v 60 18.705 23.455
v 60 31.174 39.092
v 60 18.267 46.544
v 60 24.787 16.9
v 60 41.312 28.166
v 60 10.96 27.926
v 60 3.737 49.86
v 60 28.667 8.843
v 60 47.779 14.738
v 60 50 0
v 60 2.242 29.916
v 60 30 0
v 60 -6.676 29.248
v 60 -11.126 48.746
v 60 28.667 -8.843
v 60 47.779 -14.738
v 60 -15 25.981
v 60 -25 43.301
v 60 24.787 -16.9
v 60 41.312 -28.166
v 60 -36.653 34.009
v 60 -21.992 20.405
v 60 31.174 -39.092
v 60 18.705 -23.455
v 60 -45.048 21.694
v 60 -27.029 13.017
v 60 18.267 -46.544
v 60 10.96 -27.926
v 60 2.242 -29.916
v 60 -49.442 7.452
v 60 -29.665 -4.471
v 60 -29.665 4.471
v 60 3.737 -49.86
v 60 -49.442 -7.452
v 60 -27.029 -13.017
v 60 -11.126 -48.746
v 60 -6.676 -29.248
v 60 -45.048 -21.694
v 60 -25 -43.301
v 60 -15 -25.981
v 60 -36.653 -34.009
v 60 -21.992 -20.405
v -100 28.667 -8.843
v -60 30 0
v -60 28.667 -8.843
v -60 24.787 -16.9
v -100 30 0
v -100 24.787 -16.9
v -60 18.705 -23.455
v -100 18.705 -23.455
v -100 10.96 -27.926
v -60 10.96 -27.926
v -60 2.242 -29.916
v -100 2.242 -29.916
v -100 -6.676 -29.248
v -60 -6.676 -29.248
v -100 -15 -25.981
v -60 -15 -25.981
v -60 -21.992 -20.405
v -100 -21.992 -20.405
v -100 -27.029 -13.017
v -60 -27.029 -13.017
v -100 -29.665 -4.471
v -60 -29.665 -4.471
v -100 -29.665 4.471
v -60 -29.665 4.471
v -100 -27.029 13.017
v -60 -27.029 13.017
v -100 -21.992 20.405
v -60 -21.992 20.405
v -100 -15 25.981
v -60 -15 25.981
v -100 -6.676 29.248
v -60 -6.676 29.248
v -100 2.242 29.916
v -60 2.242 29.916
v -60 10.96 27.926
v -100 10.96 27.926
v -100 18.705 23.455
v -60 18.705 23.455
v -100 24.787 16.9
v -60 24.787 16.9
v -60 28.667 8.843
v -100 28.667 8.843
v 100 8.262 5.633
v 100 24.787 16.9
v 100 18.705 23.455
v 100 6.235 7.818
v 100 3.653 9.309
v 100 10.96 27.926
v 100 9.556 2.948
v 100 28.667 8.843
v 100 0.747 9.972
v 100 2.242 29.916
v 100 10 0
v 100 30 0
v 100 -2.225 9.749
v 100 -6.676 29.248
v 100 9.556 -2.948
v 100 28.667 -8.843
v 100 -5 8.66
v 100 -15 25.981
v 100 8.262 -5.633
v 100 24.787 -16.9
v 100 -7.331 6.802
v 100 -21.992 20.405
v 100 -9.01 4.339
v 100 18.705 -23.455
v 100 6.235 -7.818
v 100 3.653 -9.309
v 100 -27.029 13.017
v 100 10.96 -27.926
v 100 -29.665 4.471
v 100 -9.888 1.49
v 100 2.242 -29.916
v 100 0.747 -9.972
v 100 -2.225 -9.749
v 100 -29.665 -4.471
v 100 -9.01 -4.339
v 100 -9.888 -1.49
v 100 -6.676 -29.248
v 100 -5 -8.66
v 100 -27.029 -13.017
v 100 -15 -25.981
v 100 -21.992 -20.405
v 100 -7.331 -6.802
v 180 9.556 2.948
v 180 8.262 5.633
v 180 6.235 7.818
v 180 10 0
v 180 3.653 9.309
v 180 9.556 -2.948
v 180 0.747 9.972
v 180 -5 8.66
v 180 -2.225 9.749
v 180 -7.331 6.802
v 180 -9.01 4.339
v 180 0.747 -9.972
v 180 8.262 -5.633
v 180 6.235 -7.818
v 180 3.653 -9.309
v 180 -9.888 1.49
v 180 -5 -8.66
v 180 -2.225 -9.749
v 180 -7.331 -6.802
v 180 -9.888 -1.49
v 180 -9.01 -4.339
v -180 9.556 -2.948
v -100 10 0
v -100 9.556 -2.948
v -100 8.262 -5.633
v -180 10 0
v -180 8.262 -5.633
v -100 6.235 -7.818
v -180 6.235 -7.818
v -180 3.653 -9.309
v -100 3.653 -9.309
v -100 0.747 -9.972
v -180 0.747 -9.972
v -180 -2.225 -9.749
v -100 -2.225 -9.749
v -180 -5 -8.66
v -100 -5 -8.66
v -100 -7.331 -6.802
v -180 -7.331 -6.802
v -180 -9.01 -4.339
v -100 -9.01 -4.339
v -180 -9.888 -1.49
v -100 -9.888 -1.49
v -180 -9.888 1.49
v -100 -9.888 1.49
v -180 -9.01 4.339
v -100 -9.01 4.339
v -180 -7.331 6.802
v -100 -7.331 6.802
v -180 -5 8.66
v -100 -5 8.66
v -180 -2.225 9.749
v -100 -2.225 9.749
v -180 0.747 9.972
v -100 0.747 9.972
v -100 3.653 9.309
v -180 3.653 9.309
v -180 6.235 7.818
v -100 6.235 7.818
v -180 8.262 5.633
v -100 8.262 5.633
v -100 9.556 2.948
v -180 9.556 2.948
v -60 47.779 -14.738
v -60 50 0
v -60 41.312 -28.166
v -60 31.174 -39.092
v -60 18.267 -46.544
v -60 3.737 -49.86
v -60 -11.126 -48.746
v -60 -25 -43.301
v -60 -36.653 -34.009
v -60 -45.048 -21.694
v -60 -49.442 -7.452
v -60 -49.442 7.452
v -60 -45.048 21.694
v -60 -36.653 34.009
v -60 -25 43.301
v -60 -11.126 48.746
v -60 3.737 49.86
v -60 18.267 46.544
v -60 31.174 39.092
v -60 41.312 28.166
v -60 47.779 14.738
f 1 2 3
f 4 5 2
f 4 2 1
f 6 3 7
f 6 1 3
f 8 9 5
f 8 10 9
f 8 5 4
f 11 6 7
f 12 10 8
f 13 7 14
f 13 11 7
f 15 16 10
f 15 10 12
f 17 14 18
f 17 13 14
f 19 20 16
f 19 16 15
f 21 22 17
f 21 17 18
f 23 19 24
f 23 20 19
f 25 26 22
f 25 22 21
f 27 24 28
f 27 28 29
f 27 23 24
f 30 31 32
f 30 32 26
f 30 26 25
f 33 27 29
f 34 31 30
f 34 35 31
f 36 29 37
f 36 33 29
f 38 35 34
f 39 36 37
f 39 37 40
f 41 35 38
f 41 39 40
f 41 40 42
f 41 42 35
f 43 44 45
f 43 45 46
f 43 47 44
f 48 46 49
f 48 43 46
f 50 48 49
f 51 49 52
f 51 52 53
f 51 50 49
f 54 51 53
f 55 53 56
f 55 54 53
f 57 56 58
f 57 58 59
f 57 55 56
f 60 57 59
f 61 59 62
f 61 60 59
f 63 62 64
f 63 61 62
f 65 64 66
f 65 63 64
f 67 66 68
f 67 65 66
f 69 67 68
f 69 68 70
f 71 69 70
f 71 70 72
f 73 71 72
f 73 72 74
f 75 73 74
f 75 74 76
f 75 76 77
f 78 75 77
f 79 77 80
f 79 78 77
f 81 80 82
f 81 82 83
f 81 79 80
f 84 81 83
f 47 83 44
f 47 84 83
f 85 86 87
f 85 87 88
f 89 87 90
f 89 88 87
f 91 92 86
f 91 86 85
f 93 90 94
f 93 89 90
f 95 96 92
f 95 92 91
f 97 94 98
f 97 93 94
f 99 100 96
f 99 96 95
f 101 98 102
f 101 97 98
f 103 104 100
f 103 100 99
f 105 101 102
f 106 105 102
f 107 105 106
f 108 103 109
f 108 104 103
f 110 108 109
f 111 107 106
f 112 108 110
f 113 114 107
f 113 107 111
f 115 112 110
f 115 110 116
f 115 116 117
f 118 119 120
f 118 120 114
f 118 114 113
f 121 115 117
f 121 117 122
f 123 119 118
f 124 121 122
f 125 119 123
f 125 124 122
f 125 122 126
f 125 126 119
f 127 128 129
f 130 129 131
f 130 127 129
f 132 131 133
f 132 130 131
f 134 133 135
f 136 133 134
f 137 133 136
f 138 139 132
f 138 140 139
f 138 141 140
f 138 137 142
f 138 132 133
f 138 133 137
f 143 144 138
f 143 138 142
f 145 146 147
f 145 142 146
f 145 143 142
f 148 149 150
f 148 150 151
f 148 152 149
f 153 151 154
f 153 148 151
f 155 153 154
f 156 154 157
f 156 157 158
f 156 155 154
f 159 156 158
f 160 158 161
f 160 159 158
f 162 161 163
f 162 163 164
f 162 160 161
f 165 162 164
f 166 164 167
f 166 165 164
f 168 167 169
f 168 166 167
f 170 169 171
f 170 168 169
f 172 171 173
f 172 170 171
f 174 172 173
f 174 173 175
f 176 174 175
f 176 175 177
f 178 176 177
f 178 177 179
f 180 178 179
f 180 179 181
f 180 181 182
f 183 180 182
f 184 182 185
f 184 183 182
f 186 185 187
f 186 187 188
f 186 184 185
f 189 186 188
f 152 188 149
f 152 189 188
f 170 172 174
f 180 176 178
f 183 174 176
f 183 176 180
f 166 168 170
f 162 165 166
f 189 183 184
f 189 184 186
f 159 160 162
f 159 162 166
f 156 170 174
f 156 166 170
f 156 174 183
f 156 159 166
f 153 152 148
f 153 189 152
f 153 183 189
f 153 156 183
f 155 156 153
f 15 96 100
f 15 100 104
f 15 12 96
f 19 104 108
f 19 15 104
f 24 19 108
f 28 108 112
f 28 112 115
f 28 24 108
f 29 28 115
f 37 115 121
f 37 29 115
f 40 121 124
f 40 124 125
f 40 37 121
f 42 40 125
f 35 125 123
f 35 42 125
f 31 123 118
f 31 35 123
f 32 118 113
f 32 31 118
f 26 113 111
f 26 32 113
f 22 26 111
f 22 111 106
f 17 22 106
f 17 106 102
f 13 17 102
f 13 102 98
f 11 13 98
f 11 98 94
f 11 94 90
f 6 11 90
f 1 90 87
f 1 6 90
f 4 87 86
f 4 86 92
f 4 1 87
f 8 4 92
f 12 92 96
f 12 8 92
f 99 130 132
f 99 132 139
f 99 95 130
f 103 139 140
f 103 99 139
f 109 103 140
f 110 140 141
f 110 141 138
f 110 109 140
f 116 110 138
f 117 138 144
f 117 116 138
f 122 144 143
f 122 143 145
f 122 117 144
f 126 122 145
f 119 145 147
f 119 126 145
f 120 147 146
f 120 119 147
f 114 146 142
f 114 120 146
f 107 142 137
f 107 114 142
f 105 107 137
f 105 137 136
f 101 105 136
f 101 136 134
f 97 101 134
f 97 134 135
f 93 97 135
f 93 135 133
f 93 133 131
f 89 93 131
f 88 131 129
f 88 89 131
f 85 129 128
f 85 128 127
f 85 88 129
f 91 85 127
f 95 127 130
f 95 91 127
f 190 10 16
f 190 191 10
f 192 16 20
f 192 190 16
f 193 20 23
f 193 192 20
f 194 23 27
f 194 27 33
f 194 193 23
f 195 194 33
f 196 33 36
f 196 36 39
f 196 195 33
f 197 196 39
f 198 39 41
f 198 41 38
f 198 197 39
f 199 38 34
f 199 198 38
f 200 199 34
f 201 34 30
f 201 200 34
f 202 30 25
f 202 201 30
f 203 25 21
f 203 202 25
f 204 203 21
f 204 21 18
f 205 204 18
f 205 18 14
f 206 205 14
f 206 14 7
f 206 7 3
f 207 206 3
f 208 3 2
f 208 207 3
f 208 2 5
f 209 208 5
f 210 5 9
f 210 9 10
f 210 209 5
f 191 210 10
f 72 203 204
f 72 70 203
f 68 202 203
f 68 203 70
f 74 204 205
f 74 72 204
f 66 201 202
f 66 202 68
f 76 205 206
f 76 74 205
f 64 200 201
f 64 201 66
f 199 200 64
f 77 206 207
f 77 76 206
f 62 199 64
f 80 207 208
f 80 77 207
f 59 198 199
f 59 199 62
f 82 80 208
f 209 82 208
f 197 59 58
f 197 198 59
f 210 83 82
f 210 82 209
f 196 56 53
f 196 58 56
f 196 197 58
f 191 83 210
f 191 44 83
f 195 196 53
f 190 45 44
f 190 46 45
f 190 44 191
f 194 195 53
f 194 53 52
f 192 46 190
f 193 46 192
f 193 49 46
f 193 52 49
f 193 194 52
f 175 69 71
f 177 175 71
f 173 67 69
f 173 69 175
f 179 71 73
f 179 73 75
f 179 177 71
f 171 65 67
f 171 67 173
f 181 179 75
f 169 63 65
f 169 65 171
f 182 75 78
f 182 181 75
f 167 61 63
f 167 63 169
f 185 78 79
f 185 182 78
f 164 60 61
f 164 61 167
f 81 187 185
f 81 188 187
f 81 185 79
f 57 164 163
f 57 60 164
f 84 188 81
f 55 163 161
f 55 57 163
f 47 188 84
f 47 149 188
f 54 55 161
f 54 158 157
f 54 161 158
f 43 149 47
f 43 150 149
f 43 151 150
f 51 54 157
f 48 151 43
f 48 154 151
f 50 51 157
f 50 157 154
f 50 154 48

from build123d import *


with BuildPart() as part:
    # Sketch1 → Revolve1 (revolve)
    with BuildSketch(Plane.XY):
        Polygon((-180, 0), (0, 0), (0, 50), (-60, 50), (-60, 30), (-100, 30), (-100, 10), (-180, 10), align=None)
        Polygon((0, 0), (180, 0), (180, 10), (100, 10), (100, 30), (60, 30), (60, 50), (0, 50), align=None)
    revolve(axis=Axis((180, 0, 0), (-1, 0, 0)))


solid = part.part
